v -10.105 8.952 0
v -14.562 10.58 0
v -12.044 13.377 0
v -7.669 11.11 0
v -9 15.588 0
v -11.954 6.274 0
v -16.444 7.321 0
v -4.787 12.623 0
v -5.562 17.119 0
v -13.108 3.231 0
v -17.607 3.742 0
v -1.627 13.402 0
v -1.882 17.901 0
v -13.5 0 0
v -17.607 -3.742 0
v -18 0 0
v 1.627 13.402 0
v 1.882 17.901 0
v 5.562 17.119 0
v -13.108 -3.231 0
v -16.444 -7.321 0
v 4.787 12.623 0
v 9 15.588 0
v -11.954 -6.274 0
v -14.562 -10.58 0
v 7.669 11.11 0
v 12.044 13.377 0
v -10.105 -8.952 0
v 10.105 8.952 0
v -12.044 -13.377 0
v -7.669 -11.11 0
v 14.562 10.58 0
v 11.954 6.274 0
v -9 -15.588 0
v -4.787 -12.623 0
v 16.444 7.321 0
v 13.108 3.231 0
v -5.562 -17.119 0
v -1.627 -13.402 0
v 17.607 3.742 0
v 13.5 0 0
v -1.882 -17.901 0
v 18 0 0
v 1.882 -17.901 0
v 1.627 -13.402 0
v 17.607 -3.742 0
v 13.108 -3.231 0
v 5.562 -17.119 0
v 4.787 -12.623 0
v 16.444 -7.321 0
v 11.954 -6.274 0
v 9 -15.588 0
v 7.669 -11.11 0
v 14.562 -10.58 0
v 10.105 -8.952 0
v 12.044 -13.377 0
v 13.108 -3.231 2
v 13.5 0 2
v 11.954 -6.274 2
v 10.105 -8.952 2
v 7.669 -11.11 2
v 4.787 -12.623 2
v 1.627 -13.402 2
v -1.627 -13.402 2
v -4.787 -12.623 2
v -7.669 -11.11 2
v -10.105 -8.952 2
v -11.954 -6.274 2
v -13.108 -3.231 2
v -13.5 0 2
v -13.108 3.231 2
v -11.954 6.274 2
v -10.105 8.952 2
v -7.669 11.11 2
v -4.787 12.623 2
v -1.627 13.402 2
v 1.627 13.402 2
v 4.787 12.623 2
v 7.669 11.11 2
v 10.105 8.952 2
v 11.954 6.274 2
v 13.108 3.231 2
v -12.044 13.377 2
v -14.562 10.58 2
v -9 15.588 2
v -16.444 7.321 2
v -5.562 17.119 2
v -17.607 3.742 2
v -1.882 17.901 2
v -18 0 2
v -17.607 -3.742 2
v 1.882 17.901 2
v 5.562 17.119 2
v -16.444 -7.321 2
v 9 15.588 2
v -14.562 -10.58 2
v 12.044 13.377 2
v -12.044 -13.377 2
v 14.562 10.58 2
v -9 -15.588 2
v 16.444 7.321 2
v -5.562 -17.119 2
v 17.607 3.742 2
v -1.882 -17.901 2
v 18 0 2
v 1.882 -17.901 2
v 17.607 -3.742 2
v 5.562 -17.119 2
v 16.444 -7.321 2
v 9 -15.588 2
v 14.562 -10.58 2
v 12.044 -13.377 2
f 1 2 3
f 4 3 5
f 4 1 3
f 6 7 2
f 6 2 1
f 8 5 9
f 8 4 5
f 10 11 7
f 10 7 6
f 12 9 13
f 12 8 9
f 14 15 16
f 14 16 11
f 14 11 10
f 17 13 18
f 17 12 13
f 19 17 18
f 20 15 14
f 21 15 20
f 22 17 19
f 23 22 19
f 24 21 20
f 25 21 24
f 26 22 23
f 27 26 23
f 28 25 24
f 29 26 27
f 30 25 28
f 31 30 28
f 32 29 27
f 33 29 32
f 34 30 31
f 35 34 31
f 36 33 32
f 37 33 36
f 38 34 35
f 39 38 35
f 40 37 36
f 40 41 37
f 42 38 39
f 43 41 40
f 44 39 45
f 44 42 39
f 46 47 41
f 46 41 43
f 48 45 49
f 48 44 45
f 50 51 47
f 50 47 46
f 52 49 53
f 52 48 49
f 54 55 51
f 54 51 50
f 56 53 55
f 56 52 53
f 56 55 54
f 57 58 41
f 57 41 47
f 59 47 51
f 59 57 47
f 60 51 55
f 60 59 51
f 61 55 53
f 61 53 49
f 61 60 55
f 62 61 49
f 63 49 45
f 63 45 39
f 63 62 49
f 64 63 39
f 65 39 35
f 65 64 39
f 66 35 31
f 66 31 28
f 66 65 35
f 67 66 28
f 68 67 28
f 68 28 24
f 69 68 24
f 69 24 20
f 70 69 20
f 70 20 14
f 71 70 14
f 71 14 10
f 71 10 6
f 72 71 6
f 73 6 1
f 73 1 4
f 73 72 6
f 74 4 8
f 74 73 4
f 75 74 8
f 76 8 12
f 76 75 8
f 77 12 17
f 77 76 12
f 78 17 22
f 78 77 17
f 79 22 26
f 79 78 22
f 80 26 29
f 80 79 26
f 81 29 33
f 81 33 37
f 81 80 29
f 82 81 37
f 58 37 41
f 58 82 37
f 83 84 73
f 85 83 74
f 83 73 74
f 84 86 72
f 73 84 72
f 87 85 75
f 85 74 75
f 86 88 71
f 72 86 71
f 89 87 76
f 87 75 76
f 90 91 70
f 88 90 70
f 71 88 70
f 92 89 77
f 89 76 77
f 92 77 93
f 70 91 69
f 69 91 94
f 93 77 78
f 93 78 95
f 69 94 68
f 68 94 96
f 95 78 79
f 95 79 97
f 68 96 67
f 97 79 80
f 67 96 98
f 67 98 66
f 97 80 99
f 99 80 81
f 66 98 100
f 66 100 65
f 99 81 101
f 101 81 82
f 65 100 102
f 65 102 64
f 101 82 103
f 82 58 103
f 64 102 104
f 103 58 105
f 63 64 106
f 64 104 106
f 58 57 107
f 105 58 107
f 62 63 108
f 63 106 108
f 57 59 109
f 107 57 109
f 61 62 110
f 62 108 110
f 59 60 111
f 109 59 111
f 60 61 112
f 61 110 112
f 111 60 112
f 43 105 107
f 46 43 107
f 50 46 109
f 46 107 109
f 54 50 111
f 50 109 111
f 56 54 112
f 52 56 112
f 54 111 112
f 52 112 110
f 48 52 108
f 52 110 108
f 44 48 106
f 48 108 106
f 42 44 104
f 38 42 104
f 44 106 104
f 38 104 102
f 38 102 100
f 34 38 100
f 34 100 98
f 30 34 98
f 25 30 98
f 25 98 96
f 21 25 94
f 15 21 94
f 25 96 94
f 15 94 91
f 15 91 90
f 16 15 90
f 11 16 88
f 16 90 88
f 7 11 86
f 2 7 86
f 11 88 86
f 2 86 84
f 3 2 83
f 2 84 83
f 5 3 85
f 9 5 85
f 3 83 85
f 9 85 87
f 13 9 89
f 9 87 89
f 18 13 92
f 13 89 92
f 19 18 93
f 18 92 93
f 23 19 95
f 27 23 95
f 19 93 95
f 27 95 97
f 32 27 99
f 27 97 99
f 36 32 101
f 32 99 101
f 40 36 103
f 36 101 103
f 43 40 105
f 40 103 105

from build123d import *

# Parameters (mm, degrees)
CYLINDER002_R       = 13.5
CYLINDER002_DEPTH   = 2
CYLINDER001_R       = 18
CYLINDER001_DEPTH   = 2
CUT_PLACEMENT_ANGLE = 180


with BuildPart() as cylinder002:
    # Cylinder002 → Cylinder002 (new body)
    with BuildSketch(Plane.XY):
        Circle(CYLINDER002_R)
    extrude(amount=CYLINDER002_DEPTH)


with BuildPart() as base:
    # Cylinder001 → Cylinder001 (new body)
    with BuildSketch(Plane.XY):
        Circle(CYLINDER001_R)
    extrude(amount=CYLINDER001_DEPTH)

    # Cut: cut Cylinder002
    add(cylinder002.part, mode=Mode.SUBTRACT)


with BuildPart() as base_1:
    # Cut placement: moved
    add(base.part.moved(Location((0, 0, 2))).rotate(Axis((0, 0, 2), (1, 0, 0)), CUT_PLACEMENT_ANGLE))


solid = base_1.part
